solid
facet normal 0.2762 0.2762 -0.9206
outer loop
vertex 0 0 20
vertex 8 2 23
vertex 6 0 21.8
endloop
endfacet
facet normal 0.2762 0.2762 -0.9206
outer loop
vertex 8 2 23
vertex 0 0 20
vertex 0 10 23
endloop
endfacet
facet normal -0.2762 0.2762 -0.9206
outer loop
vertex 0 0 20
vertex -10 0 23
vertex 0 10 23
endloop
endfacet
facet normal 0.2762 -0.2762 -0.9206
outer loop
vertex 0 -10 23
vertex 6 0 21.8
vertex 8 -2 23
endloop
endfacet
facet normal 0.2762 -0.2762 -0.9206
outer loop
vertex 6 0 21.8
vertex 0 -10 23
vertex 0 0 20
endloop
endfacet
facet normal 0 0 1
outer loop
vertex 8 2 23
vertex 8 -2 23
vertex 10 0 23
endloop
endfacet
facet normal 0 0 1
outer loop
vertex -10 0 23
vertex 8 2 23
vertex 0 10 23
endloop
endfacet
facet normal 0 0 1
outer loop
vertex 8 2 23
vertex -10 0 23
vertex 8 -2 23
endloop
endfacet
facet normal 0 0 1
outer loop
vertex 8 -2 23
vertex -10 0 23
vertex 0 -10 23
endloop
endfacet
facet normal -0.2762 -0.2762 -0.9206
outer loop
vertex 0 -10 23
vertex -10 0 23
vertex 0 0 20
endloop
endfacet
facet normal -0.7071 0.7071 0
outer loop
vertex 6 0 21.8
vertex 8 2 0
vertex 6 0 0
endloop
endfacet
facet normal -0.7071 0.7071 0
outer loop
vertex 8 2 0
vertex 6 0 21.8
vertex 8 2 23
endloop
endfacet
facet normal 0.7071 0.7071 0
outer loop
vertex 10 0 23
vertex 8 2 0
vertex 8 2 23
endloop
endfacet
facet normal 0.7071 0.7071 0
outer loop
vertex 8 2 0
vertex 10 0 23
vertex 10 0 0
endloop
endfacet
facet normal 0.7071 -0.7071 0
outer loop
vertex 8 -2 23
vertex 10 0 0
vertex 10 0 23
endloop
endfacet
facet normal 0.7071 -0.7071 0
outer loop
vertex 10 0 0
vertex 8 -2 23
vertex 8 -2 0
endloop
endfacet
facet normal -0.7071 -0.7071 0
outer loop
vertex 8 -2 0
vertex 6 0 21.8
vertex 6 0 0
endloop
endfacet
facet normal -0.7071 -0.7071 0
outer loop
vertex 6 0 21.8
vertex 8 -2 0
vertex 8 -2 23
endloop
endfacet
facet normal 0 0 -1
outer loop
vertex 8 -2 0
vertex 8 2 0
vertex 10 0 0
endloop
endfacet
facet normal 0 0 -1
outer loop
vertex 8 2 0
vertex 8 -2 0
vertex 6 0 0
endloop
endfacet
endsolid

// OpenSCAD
translate([0, 0, 20]) {
	cylinder(r1=0, r2=10, h=3, $fn=4);
}
translate([8, 0, 0]) {
	cylinder(r=2, h=23, $fn=4);
}
